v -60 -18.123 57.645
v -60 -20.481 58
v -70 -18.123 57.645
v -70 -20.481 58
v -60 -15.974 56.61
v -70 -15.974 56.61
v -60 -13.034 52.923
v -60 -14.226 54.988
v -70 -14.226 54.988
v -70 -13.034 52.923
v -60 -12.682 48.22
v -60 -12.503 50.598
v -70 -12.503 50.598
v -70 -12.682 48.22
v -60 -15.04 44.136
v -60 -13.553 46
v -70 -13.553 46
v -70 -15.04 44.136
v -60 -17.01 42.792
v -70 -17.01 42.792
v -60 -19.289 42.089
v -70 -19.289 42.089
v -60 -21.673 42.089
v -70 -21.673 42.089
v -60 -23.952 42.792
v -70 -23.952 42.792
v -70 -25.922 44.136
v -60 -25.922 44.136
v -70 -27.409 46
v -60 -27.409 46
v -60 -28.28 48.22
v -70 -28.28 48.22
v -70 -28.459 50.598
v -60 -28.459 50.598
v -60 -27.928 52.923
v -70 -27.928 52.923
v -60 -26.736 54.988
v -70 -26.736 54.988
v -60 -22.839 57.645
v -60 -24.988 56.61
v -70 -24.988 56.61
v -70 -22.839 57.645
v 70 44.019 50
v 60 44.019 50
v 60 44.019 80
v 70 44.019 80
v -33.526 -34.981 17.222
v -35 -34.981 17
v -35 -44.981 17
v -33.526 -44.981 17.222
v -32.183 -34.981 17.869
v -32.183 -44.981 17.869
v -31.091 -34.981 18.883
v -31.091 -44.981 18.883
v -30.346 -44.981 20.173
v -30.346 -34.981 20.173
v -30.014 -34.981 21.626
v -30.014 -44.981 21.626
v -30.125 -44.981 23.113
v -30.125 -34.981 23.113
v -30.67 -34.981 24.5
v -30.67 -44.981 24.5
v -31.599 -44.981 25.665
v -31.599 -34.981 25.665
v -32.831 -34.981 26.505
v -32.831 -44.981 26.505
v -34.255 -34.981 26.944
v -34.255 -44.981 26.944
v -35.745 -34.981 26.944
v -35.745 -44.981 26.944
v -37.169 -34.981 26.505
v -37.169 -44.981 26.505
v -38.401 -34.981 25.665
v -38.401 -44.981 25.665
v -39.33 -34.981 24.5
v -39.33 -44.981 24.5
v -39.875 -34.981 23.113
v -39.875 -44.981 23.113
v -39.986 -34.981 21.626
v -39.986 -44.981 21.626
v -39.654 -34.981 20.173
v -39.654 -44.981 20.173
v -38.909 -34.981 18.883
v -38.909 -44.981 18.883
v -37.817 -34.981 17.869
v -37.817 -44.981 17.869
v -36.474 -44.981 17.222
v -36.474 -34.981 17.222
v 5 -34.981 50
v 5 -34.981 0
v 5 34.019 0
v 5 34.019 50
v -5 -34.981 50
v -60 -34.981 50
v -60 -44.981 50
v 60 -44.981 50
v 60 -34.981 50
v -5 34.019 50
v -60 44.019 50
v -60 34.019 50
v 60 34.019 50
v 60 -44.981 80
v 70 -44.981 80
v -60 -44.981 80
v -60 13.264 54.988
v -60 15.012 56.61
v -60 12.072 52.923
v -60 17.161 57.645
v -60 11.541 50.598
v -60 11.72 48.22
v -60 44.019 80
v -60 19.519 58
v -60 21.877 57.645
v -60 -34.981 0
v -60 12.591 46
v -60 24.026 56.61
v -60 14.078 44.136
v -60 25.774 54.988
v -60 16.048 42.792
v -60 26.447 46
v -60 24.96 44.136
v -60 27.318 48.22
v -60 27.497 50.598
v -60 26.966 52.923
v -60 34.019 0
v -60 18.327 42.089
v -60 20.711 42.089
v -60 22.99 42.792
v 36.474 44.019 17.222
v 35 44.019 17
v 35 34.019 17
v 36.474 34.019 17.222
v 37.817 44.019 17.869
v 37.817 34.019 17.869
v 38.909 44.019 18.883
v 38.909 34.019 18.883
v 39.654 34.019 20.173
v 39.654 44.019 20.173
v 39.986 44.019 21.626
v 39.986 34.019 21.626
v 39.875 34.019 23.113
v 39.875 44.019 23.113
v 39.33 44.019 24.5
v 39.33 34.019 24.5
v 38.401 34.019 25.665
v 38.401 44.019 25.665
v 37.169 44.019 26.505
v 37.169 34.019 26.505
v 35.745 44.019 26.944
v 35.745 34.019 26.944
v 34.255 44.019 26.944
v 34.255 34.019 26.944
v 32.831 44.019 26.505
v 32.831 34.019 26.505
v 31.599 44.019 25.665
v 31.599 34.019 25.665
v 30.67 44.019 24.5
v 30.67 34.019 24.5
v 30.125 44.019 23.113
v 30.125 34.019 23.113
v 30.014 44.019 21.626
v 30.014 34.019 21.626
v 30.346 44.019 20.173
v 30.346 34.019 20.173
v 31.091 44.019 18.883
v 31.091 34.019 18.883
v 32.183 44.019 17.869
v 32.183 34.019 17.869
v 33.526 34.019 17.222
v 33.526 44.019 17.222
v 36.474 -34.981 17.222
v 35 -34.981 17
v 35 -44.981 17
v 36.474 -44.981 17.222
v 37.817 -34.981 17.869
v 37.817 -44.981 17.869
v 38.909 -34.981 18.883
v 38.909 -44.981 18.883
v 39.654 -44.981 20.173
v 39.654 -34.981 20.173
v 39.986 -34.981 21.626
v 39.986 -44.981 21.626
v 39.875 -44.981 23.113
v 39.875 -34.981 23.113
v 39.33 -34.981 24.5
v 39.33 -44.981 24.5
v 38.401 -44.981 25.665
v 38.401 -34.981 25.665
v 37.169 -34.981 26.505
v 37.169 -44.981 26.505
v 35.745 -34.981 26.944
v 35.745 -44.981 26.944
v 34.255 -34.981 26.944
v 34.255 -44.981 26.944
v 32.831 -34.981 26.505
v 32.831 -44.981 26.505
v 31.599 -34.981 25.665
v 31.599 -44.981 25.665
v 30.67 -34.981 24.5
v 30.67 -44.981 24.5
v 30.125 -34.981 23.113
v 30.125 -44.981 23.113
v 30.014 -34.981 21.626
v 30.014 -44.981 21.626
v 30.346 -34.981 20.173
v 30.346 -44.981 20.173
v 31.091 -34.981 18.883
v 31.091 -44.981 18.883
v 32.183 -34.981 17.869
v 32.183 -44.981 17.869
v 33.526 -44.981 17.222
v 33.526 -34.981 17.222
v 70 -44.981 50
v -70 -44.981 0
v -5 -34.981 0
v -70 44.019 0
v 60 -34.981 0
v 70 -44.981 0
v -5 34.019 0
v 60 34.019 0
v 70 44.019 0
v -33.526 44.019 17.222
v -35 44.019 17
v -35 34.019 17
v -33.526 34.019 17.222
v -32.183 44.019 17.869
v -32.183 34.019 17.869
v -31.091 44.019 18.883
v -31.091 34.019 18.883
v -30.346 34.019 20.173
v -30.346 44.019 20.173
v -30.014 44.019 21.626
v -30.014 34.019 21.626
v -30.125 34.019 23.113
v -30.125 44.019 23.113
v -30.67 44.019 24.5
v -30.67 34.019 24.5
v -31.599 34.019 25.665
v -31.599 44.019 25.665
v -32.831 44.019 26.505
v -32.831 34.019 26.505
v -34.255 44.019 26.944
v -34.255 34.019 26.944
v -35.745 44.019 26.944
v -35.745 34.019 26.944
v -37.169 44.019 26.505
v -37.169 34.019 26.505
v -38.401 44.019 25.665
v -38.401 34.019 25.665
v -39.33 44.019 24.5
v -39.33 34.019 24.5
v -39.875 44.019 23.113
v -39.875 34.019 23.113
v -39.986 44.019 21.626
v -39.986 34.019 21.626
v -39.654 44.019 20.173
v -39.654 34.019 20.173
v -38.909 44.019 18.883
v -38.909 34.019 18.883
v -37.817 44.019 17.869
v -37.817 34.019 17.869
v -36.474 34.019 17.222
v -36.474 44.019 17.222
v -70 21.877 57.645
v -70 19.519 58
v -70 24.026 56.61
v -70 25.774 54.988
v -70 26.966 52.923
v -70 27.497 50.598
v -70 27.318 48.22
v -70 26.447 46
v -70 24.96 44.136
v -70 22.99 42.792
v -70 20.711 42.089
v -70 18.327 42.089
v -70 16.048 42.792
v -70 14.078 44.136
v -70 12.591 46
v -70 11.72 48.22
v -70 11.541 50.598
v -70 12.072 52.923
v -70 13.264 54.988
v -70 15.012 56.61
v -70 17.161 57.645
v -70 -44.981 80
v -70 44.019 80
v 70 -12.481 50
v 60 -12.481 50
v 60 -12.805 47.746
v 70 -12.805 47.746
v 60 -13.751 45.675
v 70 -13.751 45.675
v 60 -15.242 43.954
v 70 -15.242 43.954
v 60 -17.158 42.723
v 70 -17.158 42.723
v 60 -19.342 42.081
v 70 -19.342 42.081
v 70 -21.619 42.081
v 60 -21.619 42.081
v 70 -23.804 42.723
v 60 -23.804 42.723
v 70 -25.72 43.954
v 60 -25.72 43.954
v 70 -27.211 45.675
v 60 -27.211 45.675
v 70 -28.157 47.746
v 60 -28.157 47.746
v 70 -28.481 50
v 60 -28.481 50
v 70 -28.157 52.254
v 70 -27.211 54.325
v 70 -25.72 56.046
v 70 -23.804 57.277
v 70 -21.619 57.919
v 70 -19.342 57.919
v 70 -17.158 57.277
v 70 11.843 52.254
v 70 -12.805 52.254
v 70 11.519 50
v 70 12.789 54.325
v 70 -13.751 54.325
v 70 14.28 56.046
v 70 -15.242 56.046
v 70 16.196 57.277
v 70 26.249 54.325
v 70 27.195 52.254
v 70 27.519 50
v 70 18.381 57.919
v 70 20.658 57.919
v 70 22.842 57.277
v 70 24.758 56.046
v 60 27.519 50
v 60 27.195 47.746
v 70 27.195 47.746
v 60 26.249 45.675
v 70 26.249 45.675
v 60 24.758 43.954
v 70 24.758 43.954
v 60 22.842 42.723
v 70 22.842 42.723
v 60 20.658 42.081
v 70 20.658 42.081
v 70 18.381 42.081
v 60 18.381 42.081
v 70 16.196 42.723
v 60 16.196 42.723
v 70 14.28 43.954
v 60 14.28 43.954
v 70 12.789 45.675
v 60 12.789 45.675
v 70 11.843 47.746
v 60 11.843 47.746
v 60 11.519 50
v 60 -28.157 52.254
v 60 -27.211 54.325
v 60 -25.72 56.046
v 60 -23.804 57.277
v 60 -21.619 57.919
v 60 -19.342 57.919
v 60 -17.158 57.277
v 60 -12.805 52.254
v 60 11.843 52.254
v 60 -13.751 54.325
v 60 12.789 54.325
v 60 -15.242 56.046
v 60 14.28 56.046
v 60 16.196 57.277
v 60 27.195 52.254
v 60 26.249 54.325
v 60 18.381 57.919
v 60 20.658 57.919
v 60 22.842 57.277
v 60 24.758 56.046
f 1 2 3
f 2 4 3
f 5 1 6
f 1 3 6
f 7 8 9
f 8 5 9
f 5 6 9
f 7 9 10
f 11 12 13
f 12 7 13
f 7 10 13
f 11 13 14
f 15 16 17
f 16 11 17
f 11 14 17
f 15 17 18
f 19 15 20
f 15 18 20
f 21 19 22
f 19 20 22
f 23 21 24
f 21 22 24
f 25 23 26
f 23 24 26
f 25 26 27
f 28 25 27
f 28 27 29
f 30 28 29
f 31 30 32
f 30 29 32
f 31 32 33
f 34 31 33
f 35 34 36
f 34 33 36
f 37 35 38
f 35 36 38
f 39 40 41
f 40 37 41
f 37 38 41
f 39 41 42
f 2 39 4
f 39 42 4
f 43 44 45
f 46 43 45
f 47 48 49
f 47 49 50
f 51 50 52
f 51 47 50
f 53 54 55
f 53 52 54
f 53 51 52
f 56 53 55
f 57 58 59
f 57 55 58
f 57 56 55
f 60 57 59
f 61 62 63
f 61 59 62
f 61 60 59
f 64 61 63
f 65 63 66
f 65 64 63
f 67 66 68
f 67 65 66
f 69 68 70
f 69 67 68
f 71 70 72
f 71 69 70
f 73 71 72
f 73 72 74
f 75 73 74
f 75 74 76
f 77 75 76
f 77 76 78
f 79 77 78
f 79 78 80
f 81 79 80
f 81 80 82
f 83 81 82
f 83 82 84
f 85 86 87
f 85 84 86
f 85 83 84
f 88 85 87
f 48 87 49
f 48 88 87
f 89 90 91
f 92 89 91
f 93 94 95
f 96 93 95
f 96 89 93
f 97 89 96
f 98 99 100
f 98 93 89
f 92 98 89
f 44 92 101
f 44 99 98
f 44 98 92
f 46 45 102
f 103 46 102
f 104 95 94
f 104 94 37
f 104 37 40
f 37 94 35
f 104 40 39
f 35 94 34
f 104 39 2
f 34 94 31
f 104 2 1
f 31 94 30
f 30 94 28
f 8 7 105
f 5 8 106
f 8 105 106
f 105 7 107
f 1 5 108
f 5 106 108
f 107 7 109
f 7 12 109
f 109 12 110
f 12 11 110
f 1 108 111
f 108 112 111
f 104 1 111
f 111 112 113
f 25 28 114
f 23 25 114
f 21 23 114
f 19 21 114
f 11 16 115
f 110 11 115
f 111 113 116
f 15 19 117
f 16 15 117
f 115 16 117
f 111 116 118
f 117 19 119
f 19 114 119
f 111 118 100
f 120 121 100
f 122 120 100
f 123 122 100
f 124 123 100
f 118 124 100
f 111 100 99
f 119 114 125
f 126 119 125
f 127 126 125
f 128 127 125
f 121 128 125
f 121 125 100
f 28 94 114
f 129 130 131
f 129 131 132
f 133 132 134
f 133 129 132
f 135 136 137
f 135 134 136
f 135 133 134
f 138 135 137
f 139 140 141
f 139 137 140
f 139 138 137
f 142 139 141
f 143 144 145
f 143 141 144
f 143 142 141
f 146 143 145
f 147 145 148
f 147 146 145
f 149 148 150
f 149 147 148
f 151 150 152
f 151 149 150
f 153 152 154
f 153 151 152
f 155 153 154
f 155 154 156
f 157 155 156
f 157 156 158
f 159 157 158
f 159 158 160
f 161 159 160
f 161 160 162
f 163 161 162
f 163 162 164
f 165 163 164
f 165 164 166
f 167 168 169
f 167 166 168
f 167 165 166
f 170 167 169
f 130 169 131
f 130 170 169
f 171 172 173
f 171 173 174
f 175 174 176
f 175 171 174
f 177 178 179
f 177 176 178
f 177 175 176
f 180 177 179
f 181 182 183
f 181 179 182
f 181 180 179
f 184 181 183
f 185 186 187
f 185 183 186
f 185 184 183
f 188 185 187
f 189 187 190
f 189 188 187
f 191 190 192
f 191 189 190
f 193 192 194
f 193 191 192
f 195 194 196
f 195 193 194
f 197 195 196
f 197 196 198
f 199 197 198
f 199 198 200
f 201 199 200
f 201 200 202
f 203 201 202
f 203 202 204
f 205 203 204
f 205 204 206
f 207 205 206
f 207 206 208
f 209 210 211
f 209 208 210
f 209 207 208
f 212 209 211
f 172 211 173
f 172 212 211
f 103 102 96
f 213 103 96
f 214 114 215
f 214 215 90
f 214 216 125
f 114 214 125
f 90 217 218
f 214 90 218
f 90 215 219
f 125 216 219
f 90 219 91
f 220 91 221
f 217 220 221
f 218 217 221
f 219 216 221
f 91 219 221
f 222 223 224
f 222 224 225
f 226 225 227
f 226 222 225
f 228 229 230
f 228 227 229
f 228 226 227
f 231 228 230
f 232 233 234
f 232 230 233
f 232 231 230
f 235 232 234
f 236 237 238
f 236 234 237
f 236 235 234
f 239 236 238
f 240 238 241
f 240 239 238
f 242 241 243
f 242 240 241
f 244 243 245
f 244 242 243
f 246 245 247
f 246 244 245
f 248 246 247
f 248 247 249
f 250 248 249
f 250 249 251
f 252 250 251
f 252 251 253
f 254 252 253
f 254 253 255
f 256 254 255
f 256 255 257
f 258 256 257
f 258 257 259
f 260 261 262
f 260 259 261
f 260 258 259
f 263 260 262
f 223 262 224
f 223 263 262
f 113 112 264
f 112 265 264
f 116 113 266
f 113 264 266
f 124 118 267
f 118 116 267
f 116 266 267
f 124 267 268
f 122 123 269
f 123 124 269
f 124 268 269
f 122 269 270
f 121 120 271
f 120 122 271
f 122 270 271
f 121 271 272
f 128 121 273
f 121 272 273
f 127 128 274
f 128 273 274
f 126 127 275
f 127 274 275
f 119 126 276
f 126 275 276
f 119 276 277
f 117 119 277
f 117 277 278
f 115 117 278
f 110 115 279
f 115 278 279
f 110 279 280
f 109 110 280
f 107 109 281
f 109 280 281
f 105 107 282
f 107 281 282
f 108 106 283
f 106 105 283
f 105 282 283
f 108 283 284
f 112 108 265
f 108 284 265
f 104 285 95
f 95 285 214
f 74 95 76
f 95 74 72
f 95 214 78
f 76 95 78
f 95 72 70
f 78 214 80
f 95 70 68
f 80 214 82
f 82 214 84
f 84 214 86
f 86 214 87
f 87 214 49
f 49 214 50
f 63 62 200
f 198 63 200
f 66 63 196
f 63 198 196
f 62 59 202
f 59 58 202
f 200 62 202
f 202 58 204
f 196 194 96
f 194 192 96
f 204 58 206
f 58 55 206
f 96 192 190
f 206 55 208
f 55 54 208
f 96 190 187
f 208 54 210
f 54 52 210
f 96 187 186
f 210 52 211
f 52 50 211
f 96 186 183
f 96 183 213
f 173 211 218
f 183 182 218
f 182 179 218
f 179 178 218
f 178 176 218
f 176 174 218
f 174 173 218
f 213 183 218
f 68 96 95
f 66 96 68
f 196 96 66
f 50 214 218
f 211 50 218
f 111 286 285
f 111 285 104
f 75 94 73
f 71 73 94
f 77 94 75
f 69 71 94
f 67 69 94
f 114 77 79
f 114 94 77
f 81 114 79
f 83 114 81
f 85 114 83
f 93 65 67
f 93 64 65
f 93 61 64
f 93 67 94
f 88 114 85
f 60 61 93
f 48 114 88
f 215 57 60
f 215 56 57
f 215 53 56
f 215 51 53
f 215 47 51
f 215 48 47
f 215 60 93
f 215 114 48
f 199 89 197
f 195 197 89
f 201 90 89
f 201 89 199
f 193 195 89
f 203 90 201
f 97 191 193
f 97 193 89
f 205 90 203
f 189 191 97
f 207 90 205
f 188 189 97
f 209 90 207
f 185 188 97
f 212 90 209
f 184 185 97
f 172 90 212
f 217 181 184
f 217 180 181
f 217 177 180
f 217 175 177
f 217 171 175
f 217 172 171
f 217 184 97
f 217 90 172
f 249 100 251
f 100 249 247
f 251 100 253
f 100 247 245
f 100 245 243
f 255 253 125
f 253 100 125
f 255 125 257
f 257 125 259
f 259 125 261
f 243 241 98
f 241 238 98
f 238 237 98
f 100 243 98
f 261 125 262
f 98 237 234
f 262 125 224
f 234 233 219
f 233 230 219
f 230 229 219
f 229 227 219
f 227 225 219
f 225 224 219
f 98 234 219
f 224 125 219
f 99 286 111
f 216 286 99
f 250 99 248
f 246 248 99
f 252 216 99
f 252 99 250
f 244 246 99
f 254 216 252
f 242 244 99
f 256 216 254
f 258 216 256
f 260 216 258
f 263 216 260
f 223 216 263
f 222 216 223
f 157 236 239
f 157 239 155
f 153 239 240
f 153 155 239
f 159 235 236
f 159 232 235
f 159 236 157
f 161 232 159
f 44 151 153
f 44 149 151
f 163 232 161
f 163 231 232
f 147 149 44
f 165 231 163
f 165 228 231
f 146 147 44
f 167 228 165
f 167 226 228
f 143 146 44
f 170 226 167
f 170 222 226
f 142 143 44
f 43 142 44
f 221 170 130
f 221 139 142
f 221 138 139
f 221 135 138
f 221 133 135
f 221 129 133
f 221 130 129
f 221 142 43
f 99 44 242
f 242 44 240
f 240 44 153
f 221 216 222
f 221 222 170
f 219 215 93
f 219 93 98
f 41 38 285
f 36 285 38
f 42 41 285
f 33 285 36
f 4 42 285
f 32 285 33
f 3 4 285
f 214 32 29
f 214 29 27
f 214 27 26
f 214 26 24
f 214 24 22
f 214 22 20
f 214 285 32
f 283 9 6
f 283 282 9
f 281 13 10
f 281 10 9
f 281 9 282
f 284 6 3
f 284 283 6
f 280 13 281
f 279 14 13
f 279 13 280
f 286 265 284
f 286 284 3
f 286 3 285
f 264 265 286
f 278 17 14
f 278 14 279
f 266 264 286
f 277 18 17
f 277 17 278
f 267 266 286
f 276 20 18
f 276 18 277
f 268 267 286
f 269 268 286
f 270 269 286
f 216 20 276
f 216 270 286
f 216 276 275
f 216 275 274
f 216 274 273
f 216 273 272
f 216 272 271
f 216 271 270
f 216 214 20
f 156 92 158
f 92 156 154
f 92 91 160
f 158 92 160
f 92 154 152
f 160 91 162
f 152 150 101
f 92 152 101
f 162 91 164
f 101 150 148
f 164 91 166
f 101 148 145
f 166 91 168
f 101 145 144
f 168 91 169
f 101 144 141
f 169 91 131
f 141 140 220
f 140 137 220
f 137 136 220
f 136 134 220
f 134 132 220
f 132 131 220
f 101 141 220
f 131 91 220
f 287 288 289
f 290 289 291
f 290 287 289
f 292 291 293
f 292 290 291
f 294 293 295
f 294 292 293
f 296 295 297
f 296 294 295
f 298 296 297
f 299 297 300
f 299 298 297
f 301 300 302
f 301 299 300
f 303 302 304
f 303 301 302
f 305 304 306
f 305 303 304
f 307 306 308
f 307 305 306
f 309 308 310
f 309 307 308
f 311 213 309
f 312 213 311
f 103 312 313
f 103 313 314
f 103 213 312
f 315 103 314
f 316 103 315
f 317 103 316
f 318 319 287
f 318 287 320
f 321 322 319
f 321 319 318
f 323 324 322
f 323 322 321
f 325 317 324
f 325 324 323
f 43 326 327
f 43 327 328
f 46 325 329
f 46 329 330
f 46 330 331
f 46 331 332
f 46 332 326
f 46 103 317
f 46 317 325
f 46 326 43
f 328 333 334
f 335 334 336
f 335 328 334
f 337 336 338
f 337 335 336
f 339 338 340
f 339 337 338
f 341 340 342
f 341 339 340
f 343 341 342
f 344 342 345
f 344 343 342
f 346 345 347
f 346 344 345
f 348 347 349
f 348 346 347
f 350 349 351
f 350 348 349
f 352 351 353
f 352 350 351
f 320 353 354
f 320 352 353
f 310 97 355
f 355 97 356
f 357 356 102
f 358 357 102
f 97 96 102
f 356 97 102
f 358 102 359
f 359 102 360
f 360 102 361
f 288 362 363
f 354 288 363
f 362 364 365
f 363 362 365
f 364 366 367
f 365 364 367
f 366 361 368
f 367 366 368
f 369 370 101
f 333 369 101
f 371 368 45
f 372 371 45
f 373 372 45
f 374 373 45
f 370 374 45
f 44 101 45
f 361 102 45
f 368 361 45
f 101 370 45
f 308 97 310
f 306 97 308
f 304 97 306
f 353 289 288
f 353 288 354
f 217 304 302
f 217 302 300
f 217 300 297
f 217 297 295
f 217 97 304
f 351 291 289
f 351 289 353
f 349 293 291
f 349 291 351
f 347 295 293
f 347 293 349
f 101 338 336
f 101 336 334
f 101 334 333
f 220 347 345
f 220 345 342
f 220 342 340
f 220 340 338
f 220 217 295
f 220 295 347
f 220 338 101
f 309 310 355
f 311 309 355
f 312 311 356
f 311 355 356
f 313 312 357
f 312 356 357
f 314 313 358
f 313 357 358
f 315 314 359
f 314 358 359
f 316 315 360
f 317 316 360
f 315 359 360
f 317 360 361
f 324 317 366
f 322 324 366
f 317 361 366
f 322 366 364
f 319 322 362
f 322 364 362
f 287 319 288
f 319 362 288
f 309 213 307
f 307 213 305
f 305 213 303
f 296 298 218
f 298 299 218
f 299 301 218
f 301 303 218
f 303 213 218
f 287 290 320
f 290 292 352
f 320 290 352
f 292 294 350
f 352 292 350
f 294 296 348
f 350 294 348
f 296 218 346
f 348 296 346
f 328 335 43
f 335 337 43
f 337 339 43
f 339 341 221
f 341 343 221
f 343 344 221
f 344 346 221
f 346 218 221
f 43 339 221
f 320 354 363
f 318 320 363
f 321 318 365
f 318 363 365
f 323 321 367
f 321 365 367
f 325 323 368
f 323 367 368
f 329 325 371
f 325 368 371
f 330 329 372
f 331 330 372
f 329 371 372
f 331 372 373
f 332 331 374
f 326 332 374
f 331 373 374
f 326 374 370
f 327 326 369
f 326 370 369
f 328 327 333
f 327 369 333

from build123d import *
from build123d.topology import SkipClean

# Parameters (mm, degrees)
SKETCH2_W               = 140
SKETCH2_H               = 89
SKETCH2_W_2             = 55
SKETCH2_H_2             = 69
BOSS_EXTRUDE2_DEPTH     = 50
CUT_EXTRUDE1_DEPTH      = 124.778027129
CUT_EXTRUDE1_DEPTH_BACK = 124.778027129
SKETCH3_R               = 5
SKETCH4_R               = 8
CUT_EXTRUDE2_DEPTH      = 15
SKETCH5_W               = 10
SKETCH5_H               = 89
BOSS_EXTRUDE4_DEPTH     = 30
SKETCH4_5_R             = 8
CUT_EXTRUDE5_DEPTH      = 30
MIRROR5_START           = 60
MIRROR5_DEPTH           = 10


# Read off the part's stored shape, not the designer's step: Mirror5
with BuildPart() as part:
    # Sketch2 → Boss-Extrude2 (new body)
    with BuildSketch(Plane.XY):
        with Locations((0, -0.480959067)):
            Rectangle(SKETCH2_W, SKETCH2_H)
        with Locations((32.5, -0.480959067)):
            Rectangle(SKETCH2_W_2, SKETCH2_H_2, mode=Mode.SUBTRACT)
        with Locations((-32.5, -0.480959067)):
            Rectangle(SKETCH2_W_2, SKETCH2_H_2, mode=Mode.SUBTRACT)
    extrude(amount=BOSS_EXTRUDE2_DEPTH)

    # Sketch3 → Cut-Extrude1 (cut, two sides: drawn at the far end of the back side and taken through both)
    with BuildSketch(Plane.XZ.offset(44.980959067).offset(-CUT_EXTRUDE1_DEPTH_BACK)):
        with Locations(Location((-35, 22, 0), (0, 0, 270))):
            Circle(SKETCH3_R)
        with Locations(Location((35, 22, 0), (0, 0, 270))):
            Circle(SKETCH3_R)
    extrude(amount=CUT_EXTRUDE1_DEPTH + CUT_EXTRUDE1_DEPTH_BACK, mode=Mode.SUBTRACT)

    # Sketch4 → Cut-Extrude2 (cut)
    with BuildSketch(Plane.ZY.offset(70)):
        with Locations((50, 19.519040933)):
            Circle(SKETCH4_R)
        with Locations((50, -20.480959067)):
            Circle(SKETCH4_R)
    cut_extrude2 = extrude(amount=-CUT_EXTRUDE2_DEPTH, mode=Mode.SUBTRACT)

    # Mirror1: Cut-Extrude2 across plane
    add(cut_extrude2.mirror(Plane(origin=(0, 0, 0), x_dir=(0, 0, 1), z_dir=(1, 0, 0))), mode=Mode.SUBTRACT)

    # Sketch5 → Boss-Extrude4 (add)
    with BuildSketch(Plane.XY.offset(50)):
        with Locations((-65, -0.480959067)):
            Rectangle(SKETCH5_W, SKETCH5_H)
    extrude(amount=BOSS_EXTRUDE4_DEPTH)

    # Sketch4<5> → Cut-Extrude5 (cut)
    with BuildSketch(Plane.ZY.offset(70)):
        with Locations((50, 19.519040933)):
            Circle(SKETCH4_5_R)
        with Locations((50, -20.480959067)):
            Circle(SKETCH4_5_R)
    extrude(amount=-CUT_EXTRUDE5_DEPTH, mode=Mode.SUBTRACT)

    # Mirror5 outline → Mirror5 (add)
    with SkipClean():  # the faces are left unmerged after this step: merging them gives an invalid solid
        with BuildSketch(Plane.YZ.offset(MIRROR5_START)):
            with BuildLine():
                ThreePointArc((-28.480959067, 50), (-20.480959067, 58), (-12.480959067, 50))
                Line((-12.480959067, 50), (11.519040933, 50))
                ThreePointArc((11.519040933, 50), (19.519040933, 58), (27.519040933, 50))
                Line((27.519040933, 50), (44.019040933, 50))
                Line((44.019040933, 50), (44.019040933, 80))
                Line((44.019040933, 80), (-44.980959067, 80))
                Line((-44.980959067, 80), (-44.980959067, 50))
                Line((-44.980959067, 50), (-28.480959067, 50))
            make_face()
        extrude(amount=MIRROR5_DEPTH)
    add(part.part.scale(1), mode=Mode.REPLACE)  # the faces are merged on a copy


solid = part.part
